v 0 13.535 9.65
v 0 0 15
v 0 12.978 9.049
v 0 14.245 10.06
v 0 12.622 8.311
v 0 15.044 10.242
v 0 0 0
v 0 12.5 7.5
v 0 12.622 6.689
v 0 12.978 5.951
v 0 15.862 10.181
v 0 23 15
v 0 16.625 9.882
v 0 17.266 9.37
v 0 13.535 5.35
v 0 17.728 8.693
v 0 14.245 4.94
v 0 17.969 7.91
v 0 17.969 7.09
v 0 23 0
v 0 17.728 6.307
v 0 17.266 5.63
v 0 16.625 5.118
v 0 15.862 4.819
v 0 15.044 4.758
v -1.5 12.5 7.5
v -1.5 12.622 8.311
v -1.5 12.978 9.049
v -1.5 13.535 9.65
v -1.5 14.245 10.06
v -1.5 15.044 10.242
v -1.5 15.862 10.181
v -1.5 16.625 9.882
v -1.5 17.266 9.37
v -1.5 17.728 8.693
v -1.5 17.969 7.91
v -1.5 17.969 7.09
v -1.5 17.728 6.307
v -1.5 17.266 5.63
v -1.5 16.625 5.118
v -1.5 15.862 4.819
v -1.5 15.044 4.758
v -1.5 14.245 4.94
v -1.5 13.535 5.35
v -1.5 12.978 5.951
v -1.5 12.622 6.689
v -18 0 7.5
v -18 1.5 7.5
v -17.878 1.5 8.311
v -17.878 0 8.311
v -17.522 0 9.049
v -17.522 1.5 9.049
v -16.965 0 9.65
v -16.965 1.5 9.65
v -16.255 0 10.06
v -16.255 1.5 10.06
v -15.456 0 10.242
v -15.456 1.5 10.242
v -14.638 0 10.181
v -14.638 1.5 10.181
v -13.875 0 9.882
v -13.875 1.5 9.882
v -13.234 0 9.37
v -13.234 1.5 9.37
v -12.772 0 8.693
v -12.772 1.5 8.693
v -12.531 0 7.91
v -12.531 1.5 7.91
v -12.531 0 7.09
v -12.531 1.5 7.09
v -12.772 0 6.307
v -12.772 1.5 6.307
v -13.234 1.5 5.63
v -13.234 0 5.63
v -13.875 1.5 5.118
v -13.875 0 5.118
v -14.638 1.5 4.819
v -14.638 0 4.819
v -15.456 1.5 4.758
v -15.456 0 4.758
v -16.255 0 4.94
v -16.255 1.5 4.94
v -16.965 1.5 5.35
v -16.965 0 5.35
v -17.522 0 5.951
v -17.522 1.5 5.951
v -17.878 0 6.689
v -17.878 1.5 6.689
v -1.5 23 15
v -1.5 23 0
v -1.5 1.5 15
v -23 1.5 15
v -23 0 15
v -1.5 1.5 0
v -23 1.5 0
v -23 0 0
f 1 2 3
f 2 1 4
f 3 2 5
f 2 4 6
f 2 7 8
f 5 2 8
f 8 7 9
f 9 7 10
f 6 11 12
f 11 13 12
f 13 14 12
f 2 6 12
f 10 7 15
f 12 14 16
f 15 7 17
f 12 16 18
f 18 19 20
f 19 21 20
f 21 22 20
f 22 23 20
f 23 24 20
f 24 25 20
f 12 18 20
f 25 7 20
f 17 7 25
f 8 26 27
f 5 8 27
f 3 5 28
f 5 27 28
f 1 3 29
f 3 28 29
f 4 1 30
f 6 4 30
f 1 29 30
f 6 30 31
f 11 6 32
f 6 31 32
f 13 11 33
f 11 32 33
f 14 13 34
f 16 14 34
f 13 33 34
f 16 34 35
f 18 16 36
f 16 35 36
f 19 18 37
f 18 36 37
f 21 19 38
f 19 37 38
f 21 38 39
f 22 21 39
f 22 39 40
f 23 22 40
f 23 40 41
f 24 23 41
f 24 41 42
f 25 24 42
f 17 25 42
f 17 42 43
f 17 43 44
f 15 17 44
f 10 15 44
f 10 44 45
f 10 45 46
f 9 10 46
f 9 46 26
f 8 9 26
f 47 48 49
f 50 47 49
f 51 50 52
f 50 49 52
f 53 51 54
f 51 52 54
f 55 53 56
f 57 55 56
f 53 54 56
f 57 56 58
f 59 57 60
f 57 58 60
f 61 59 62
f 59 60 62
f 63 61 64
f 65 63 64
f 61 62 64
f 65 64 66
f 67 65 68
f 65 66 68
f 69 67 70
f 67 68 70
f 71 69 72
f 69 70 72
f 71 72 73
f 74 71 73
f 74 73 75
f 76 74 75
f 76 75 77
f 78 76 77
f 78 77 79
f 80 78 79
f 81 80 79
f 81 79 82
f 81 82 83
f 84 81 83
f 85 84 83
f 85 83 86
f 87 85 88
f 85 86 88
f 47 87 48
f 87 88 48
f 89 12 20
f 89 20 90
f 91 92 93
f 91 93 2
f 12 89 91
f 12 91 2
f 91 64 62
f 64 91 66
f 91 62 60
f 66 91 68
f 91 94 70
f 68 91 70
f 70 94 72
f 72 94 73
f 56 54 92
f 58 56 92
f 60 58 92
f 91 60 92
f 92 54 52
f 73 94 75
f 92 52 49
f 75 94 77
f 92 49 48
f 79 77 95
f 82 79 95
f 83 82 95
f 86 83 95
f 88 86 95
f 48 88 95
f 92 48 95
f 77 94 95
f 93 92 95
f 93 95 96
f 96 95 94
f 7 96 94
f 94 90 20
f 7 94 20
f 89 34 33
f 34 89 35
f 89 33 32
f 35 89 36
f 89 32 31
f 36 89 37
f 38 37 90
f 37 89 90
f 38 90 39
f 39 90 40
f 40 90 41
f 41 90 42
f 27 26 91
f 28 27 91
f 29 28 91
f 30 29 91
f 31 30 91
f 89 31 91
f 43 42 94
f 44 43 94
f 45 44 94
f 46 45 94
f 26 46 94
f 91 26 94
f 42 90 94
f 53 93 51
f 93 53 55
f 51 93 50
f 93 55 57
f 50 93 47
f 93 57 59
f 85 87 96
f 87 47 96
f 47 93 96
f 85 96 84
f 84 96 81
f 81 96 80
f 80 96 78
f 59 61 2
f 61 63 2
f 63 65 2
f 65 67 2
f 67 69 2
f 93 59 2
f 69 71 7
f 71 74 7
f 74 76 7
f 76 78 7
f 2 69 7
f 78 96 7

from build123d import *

# Parameters (mm, degrees)
PAD_DEPTH       = 15
SKETCH001_R     = 2.75
POCKET_DEPTH    = 1.5
SKETCH002_R     = 2.75
POCKET001_DEPTH = 1.501


with BuildPart() as part:
    # Sketch → Pad (new body)
    with BuildSketch(Plane.XY):
        Polygon((-1.5, 1.5), (-23, 1.5), (-23, 0), (0, 0), (0, 23), (-1.5, 23), align=None)
    extrude(amount=PAD_DEPTH)

    # Sketch001 → Pocket (cut)
    with BuildSketch(Plane(origin=(0, 1.5, 0), x_dir=(-1, 0, 0), z_dir=(0, 1, 0))):
        with Locations((15.25, 7.5)):
            Circle(SKETCH001_R)
    extrude(amount=-POCKET_DEPTH, mode=Mode.SUBTRACT)

    # Sketch002 → Pocket001 (cut, through all)
    with BuildSketch(Plane(origin=(-1.5, 0, 0), x_dir=(0, -1, 0), z_dir=(-1, 0, 0))):
        with Locations((-15.25, 7.5)):
            Circle(SKETCH002_R)
    extrude(amount=-POCKET001_DEPTH, mode=Mode.SUBTRACT)


solid = part.part
